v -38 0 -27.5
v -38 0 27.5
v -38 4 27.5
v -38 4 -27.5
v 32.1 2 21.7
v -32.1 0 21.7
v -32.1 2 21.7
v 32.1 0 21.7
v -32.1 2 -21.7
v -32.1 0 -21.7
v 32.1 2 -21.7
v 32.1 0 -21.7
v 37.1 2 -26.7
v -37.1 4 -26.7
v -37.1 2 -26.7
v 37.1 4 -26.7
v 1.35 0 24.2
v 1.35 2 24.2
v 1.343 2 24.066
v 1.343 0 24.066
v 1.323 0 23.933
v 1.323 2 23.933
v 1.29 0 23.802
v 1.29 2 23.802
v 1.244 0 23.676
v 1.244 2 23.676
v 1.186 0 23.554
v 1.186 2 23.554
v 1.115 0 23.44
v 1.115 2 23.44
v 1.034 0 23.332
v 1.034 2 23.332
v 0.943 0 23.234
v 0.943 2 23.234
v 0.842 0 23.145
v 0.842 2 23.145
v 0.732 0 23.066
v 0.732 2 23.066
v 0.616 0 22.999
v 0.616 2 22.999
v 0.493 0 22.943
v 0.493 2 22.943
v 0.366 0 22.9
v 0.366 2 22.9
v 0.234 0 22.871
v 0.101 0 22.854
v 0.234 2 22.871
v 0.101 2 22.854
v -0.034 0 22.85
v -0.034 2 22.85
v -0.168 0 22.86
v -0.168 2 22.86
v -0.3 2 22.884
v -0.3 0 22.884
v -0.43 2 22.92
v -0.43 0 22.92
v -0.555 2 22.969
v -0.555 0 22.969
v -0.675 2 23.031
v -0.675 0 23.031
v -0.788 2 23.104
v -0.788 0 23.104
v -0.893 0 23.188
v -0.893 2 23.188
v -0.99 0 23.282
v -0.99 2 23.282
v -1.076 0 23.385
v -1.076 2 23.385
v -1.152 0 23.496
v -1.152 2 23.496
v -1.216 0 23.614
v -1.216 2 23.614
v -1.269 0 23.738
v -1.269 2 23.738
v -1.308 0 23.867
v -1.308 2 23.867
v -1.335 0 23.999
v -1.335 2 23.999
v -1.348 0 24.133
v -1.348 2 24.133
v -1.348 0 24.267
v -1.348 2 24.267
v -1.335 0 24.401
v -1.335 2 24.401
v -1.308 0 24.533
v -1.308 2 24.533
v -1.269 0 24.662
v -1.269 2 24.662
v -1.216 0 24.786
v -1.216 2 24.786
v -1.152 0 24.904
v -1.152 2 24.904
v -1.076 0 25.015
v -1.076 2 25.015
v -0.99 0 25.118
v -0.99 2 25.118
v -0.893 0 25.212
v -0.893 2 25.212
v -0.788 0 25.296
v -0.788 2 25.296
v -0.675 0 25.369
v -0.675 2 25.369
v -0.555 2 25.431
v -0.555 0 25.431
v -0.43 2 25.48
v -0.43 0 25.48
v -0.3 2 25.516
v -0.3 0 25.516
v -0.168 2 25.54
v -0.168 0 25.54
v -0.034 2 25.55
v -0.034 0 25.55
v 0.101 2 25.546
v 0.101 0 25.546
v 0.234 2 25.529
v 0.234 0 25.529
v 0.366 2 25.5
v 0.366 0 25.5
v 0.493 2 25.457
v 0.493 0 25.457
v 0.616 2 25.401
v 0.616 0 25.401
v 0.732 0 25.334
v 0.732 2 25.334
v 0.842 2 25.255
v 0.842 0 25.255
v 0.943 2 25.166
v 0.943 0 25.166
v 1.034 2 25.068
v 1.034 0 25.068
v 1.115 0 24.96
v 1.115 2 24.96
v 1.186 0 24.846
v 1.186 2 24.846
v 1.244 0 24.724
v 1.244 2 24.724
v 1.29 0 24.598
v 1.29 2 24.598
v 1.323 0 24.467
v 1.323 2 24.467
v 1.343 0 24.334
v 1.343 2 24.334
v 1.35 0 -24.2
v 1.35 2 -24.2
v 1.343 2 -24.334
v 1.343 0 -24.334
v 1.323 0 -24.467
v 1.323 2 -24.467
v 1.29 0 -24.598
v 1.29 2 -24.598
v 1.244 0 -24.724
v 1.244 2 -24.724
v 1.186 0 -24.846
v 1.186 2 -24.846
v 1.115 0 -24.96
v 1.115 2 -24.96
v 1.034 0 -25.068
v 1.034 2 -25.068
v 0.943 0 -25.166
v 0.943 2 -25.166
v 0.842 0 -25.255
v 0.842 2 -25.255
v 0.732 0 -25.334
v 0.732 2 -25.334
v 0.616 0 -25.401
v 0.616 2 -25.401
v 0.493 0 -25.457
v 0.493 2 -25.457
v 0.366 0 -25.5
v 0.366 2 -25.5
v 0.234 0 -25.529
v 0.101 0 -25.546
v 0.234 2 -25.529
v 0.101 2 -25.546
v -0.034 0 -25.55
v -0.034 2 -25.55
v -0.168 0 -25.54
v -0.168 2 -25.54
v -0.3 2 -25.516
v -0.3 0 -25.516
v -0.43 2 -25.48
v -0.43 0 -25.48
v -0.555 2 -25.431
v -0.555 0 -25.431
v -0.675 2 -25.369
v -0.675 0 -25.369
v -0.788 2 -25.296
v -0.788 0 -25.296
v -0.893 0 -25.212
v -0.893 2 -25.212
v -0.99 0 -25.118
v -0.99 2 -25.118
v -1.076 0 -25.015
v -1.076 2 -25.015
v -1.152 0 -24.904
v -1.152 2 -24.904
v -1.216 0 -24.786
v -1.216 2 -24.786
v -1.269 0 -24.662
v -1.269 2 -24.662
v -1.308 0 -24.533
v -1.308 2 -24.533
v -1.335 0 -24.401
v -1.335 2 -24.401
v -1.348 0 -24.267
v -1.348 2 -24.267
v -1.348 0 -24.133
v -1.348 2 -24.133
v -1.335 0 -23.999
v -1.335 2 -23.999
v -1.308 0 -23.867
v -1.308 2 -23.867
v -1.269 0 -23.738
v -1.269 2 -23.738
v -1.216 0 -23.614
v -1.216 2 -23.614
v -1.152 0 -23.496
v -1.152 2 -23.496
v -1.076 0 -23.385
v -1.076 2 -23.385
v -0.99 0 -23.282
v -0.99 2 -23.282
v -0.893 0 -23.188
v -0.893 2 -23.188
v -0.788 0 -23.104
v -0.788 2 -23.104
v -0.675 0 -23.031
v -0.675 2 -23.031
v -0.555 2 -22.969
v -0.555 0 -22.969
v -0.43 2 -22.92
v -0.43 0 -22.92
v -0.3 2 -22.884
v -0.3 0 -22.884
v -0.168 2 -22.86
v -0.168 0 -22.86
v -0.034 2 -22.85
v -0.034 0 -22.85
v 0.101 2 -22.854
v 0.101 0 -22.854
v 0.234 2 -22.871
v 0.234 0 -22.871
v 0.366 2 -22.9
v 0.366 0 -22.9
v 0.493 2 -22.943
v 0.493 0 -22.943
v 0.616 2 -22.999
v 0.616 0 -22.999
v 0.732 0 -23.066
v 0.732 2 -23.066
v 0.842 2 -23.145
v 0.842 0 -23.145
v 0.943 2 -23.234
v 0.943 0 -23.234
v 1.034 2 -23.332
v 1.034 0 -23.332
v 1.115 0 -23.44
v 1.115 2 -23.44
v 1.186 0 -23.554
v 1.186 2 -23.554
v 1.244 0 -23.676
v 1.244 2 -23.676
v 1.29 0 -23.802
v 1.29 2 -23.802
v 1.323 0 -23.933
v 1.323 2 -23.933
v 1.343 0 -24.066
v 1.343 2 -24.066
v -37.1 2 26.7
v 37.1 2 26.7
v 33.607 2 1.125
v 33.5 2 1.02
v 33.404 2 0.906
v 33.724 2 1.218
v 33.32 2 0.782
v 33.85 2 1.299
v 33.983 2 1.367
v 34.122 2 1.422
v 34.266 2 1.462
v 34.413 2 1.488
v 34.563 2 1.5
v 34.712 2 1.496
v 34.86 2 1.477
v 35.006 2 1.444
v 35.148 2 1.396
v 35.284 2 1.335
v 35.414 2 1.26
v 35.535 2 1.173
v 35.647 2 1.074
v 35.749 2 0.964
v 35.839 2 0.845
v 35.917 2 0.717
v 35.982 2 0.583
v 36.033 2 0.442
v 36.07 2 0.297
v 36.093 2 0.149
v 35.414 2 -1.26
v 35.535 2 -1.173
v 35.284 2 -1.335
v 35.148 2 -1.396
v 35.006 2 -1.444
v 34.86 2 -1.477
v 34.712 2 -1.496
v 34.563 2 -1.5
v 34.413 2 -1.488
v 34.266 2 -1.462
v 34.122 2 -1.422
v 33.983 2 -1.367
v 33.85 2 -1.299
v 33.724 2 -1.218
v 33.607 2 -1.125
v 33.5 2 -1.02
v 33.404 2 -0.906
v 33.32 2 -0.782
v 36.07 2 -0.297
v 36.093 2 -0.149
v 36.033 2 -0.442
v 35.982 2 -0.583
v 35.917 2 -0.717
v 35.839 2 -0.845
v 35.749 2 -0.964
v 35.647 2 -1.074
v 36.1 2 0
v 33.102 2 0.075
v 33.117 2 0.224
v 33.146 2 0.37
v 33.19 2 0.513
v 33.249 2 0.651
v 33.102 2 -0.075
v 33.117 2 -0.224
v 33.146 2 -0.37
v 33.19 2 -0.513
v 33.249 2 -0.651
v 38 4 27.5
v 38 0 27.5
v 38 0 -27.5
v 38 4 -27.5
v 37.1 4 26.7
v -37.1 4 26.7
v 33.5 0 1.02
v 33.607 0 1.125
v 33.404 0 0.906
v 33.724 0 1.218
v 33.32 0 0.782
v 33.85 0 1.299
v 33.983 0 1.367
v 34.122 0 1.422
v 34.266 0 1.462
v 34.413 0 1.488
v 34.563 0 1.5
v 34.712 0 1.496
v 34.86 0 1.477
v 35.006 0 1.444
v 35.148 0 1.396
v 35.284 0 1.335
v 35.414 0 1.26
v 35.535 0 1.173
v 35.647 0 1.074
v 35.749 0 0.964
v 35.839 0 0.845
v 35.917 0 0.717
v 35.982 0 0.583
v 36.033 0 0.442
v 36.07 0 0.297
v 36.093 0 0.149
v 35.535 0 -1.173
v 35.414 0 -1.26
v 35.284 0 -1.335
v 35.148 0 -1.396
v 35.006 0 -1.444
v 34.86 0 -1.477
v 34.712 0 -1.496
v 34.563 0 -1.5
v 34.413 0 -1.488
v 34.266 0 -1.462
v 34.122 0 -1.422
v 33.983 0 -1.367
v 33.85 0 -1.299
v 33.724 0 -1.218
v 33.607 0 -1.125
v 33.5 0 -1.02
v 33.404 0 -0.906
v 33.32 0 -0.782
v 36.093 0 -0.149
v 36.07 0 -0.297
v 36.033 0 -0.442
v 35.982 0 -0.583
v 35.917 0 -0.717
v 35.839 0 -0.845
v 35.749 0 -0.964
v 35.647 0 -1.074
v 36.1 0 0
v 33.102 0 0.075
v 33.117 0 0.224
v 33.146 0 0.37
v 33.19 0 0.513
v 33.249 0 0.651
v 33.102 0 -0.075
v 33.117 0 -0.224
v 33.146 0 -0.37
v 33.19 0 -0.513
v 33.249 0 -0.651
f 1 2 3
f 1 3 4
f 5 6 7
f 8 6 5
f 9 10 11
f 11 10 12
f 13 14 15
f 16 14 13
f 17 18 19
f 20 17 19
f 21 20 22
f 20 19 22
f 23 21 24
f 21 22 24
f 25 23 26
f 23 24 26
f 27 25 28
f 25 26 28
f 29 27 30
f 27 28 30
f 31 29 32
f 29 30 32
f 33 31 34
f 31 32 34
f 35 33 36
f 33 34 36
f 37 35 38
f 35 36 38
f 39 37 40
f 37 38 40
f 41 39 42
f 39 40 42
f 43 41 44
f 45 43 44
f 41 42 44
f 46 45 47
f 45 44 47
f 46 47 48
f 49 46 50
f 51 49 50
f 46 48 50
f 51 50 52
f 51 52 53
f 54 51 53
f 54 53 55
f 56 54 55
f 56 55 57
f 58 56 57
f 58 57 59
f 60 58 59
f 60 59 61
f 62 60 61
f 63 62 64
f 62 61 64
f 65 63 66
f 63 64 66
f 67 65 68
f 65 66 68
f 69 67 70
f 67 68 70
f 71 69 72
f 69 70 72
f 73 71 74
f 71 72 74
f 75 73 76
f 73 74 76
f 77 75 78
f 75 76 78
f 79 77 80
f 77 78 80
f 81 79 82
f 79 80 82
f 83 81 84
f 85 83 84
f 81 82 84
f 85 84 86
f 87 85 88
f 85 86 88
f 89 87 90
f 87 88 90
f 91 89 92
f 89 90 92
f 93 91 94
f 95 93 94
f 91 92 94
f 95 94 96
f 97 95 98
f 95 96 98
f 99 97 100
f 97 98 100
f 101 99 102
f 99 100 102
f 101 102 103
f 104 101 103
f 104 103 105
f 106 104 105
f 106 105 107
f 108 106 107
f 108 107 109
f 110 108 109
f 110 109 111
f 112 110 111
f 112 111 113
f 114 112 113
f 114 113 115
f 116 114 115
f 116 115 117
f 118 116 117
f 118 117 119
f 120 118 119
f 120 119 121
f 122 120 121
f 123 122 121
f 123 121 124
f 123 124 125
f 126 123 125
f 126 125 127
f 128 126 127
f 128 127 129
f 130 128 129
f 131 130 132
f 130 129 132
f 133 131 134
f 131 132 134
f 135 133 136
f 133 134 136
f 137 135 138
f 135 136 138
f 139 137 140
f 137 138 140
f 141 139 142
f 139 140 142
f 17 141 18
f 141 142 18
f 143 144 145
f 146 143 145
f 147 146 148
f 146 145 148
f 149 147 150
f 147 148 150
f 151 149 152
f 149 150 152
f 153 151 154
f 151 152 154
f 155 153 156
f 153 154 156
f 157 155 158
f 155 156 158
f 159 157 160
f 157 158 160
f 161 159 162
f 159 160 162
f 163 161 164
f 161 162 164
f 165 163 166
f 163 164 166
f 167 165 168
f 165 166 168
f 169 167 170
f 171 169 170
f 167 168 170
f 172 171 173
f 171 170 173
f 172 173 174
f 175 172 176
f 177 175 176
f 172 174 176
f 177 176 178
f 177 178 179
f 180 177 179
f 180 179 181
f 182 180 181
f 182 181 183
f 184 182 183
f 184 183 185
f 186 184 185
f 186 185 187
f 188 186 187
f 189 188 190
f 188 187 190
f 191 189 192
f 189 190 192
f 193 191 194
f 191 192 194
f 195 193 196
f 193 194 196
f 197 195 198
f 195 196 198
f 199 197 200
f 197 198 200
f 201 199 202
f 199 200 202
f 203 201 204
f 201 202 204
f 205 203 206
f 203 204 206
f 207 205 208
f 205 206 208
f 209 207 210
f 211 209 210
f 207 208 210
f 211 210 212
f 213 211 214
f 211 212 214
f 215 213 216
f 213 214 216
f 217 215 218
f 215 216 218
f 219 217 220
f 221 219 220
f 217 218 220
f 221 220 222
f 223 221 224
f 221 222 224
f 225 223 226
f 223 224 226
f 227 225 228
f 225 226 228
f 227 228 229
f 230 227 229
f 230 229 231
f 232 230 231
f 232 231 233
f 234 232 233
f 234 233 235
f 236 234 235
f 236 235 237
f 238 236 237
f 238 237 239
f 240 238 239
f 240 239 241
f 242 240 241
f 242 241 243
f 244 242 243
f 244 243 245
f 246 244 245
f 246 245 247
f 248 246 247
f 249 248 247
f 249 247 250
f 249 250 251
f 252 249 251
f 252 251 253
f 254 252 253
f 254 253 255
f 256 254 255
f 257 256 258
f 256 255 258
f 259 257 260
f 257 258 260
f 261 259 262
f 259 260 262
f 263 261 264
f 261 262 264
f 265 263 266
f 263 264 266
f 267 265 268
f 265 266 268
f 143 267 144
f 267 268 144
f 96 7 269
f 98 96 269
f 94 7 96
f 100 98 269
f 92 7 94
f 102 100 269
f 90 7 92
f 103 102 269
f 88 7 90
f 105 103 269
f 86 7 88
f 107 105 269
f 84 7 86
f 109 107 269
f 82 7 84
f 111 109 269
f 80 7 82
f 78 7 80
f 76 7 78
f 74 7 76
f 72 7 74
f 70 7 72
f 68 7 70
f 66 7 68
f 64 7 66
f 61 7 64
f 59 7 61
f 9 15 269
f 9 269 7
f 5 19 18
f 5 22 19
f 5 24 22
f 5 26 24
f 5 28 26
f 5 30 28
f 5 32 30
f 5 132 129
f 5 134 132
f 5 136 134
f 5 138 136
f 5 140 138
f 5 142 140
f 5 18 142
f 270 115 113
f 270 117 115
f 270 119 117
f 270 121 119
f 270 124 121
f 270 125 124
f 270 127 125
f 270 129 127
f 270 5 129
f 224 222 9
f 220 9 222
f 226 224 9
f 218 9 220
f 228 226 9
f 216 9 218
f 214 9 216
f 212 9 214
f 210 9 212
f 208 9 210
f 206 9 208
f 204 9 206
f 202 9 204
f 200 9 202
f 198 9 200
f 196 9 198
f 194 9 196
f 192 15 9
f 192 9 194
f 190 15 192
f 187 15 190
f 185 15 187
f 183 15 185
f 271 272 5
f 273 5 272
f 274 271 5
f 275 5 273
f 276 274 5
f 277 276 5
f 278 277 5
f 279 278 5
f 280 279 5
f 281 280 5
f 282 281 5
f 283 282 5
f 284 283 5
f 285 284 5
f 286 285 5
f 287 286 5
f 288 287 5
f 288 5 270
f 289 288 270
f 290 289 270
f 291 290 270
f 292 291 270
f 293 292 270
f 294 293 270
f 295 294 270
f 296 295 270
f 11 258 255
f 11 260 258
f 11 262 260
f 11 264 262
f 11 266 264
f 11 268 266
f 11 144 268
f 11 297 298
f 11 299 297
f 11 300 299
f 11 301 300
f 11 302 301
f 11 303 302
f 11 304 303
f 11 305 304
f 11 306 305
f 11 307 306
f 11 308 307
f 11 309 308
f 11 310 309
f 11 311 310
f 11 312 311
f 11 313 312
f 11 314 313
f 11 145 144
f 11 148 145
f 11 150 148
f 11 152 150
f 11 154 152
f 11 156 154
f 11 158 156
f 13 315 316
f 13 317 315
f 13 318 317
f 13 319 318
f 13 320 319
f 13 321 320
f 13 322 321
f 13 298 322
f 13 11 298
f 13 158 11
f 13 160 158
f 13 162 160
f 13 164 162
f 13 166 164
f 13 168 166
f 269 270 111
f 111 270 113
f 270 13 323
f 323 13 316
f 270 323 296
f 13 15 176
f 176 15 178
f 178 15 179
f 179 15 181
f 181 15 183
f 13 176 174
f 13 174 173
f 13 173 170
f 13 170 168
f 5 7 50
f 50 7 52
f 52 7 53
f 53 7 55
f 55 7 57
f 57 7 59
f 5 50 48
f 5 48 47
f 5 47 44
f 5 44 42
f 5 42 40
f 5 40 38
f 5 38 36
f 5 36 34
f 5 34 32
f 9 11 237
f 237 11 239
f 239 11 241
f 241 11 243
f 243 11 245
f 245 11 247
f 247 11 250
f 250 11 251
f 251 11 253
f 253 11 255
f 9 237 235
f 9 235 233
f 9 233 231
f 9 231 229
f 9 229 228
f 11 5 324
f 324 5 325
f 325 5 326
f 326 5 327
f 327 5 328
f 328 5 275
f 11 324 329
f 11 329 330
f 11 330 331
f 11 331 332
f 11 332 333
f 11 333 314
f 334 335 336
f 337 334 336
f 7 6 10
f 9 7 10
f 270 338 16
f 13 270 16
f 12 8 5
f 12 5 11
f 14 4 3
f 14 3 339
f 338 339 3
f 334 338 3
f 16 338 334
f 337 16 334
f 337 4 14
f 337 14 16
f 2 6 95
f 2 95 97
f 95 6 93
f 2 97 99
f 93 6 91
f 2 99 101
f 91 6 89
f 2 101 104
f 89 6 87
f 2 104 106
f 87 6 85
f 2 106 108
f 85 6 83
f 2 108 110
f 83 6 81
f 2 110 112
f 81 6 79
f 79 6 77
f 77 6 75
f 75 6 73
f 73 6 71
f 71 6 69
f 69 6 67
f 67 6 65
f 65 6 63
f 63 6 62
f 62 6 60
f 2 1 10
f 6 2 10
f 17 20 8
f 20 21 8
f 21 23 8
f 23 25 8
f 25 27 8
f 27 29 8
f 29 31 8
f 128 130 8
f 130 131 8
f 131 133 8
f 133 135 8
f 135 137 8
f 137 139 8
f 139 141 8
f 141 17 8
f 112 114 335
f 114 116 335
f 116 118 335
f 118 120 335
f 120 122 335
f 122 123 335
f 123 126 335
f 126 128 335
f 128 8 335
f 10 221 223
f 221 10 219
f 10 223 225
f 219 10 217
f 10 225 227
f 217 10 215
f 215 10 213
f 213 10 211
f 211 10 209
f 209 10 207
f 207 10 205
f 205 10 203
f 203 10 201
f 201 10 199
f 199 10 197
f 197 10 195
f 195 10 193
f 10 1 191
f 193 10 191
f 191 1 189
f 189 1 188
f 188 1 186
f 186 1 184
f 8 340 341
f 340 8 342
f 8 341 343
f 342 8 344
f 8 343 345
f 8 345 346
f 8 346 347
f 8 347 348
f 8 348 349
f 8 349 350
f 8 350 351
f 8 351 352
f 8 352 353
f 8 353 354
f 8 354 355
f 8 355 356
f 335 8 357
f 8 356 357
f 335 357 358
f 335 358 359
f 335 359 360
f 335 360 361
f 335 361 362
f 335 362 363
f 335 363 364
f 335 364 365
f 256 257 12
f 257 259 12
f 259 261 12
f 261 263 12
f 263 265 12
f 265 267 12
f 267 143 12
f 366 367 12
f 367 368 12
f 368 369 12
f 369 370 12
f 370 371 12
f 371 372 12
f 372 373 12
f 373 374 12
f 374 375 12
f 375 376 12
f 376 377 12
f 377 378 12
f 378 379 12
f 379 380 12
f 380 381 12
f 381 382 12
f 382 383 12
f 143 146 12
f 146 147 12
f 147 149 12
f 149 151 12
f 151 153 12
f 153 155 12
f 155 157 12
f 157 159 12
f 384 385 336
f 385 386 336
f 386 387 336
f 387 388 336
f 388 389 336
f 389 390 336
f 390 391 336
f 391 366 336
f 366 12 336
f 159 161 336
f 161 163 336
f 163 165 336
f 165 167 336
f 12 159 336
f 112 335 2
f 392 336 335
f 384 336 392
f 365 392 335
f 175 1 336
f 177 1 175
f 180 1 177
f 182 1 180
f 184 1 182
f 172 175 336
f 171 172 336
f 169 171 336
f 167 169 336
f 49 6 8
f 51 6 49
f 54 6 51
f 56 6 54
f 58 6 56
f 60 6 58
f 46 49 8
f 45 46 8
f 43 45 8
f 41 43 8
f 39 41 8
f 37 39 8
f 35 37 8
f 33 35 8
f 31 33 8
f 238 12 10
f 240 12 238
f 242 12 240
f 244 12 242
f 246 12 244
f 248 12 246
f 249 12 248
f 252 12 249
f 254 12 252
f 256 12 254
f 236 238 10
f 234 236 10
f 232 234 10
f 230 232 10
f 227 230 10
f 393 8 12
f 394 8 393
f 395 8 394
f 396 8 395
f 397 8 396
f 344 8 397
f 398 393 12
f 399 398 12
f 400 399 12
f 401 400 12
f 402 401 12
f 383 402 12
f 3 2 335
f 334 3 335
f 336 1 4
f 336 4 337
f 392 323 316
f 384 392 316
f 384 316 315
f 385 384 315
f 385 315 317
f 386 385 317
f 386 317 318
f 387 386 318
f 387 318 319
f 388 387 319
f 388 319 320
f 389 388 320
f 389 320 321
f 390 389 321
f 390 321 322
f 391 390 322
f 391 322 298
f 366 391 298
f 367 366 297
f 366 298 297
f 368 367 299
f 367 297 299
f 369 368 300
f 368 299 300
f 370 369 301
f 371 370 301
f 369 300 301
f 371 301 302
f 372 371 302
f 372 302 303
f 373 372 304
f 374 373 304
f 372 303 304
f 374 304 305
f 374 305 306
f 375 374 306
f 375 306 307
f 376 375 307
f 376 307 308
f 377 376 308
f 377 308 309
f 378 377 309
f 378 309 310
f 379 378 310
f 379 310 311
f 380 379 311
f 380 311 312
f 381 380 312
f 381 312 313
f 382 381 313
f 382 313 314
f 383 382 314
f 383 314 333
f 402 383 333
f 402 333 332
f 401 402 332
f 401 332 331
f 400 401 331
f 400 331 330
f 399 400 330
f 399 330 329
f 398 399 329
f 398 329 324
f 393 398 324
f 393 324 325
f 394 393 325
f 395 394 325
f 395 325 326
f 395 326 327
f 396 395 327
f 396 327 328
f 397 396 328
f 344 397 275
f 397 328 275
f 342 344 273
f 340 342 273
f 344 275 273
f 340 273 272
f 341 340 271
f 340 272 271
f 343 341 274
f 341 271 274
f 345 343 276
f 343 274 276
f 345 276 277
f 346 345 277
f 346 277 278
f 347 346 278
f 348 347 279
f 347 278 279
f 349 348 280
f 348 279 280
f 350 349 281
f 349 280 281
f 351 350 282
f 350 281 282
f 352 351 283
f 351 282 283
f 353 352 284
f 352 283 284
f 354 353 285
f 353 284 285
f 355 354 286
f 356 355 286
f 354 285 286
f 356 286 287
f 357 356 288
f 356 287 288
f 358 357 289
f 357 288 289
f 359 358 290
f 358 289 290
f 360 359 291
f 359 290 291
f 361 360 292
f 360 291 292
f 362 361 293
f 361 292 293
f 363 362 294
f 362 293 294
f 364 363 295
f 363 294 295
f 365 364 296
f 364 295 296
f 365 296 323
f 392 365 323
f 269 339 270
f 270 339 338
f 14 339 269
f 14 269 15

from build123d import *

# Parameters (mm, degrees)
SKETCH1_W           = 76
SKETCH1_H           = 55
SKETCH1_W_2         = 64.2
SKETCH1_H_2         = 43.4
BOSS_EXTRUDE1_DEPTH = 4
SKETCH2_W           = 74.2
SKETCH2_H           = 53.4
CUT_EXTRUDE1_DEPTH  = 2
SKETCH3_R           = 1.35
CUT_EXTRUDE2_DEPTH  = 2
CUT_EXTRUDE3_REACH  = 4
SKETCH4_R           = 1.5


with BuildPart() as part:
    # Sketch1 → Boss-Extrude1 (new body)
    with BuildSketch(Plane(origin=(0, 0, 0), x_dir=(1, 0, 0), z_dir=(0, 1, 0))):
        Rectangle(SKETCH1_W, SKETCH1_H)
        Rectangle(SKETCH1_W_2, SKETCH1_H_2, mode=Mode.SUBTRACT)
    extrude(amount=BOSS_EXTRUDE1_DEPTH)

    # Sketch2 → Cut-Extrude1 (cut)
    with BuildSketch(Plane(origin=(0, 4, 0), x_dir=(1, 0, 0), z_dir=(0, 1, 0))):
        Rectangle(SKETCH2_W, SKETCH2_H)
    extrude(amount=-CUT_EXTRUDE1_DEPTH, mode=Mode.SUBTRACT)

    # Sketch3 → Cut-Extrude2 (cut)
    with BuildSketch(Plane(origin=(0, 2, 0), x_dir=(1, 0, 0), z_dir=(0, 1, 0))):
        with Locations((0, 24.2)):
            Circle(SKETCH3_R)
        with Locations((0, -24.2)):
            Circle(SKETCH3_R)
    extrude(amount=-CUT_EXTRUDE2_DEPTH, mode=Mode.SUBTRACT)

    # Sketch4 → Cut-Extrude3 (cut, up to next)
    with BuildSketch(Plane(origin=(0, 2, 0), x_dir=(1, 0, 0), z_dir=(0, 1, 0)), mode=Mode.PRIVATE) as cut_extrude3_sk1:
        with Locations((34.6, 0)):
            Circle(SKETCH4_R)
    cut_extrude3_tool1 = extrude(cut_extrude3_sk1.sketch, amount=-CUT_EXTRUDE3_REACH, mode=Mode.PRIVATE) & part.part
    add(cut_extrude3_tool1.solids().sort_by_distance((34.6, 2, 0))[0], mode=Mode.SUBTRACT)


solid = part.part
